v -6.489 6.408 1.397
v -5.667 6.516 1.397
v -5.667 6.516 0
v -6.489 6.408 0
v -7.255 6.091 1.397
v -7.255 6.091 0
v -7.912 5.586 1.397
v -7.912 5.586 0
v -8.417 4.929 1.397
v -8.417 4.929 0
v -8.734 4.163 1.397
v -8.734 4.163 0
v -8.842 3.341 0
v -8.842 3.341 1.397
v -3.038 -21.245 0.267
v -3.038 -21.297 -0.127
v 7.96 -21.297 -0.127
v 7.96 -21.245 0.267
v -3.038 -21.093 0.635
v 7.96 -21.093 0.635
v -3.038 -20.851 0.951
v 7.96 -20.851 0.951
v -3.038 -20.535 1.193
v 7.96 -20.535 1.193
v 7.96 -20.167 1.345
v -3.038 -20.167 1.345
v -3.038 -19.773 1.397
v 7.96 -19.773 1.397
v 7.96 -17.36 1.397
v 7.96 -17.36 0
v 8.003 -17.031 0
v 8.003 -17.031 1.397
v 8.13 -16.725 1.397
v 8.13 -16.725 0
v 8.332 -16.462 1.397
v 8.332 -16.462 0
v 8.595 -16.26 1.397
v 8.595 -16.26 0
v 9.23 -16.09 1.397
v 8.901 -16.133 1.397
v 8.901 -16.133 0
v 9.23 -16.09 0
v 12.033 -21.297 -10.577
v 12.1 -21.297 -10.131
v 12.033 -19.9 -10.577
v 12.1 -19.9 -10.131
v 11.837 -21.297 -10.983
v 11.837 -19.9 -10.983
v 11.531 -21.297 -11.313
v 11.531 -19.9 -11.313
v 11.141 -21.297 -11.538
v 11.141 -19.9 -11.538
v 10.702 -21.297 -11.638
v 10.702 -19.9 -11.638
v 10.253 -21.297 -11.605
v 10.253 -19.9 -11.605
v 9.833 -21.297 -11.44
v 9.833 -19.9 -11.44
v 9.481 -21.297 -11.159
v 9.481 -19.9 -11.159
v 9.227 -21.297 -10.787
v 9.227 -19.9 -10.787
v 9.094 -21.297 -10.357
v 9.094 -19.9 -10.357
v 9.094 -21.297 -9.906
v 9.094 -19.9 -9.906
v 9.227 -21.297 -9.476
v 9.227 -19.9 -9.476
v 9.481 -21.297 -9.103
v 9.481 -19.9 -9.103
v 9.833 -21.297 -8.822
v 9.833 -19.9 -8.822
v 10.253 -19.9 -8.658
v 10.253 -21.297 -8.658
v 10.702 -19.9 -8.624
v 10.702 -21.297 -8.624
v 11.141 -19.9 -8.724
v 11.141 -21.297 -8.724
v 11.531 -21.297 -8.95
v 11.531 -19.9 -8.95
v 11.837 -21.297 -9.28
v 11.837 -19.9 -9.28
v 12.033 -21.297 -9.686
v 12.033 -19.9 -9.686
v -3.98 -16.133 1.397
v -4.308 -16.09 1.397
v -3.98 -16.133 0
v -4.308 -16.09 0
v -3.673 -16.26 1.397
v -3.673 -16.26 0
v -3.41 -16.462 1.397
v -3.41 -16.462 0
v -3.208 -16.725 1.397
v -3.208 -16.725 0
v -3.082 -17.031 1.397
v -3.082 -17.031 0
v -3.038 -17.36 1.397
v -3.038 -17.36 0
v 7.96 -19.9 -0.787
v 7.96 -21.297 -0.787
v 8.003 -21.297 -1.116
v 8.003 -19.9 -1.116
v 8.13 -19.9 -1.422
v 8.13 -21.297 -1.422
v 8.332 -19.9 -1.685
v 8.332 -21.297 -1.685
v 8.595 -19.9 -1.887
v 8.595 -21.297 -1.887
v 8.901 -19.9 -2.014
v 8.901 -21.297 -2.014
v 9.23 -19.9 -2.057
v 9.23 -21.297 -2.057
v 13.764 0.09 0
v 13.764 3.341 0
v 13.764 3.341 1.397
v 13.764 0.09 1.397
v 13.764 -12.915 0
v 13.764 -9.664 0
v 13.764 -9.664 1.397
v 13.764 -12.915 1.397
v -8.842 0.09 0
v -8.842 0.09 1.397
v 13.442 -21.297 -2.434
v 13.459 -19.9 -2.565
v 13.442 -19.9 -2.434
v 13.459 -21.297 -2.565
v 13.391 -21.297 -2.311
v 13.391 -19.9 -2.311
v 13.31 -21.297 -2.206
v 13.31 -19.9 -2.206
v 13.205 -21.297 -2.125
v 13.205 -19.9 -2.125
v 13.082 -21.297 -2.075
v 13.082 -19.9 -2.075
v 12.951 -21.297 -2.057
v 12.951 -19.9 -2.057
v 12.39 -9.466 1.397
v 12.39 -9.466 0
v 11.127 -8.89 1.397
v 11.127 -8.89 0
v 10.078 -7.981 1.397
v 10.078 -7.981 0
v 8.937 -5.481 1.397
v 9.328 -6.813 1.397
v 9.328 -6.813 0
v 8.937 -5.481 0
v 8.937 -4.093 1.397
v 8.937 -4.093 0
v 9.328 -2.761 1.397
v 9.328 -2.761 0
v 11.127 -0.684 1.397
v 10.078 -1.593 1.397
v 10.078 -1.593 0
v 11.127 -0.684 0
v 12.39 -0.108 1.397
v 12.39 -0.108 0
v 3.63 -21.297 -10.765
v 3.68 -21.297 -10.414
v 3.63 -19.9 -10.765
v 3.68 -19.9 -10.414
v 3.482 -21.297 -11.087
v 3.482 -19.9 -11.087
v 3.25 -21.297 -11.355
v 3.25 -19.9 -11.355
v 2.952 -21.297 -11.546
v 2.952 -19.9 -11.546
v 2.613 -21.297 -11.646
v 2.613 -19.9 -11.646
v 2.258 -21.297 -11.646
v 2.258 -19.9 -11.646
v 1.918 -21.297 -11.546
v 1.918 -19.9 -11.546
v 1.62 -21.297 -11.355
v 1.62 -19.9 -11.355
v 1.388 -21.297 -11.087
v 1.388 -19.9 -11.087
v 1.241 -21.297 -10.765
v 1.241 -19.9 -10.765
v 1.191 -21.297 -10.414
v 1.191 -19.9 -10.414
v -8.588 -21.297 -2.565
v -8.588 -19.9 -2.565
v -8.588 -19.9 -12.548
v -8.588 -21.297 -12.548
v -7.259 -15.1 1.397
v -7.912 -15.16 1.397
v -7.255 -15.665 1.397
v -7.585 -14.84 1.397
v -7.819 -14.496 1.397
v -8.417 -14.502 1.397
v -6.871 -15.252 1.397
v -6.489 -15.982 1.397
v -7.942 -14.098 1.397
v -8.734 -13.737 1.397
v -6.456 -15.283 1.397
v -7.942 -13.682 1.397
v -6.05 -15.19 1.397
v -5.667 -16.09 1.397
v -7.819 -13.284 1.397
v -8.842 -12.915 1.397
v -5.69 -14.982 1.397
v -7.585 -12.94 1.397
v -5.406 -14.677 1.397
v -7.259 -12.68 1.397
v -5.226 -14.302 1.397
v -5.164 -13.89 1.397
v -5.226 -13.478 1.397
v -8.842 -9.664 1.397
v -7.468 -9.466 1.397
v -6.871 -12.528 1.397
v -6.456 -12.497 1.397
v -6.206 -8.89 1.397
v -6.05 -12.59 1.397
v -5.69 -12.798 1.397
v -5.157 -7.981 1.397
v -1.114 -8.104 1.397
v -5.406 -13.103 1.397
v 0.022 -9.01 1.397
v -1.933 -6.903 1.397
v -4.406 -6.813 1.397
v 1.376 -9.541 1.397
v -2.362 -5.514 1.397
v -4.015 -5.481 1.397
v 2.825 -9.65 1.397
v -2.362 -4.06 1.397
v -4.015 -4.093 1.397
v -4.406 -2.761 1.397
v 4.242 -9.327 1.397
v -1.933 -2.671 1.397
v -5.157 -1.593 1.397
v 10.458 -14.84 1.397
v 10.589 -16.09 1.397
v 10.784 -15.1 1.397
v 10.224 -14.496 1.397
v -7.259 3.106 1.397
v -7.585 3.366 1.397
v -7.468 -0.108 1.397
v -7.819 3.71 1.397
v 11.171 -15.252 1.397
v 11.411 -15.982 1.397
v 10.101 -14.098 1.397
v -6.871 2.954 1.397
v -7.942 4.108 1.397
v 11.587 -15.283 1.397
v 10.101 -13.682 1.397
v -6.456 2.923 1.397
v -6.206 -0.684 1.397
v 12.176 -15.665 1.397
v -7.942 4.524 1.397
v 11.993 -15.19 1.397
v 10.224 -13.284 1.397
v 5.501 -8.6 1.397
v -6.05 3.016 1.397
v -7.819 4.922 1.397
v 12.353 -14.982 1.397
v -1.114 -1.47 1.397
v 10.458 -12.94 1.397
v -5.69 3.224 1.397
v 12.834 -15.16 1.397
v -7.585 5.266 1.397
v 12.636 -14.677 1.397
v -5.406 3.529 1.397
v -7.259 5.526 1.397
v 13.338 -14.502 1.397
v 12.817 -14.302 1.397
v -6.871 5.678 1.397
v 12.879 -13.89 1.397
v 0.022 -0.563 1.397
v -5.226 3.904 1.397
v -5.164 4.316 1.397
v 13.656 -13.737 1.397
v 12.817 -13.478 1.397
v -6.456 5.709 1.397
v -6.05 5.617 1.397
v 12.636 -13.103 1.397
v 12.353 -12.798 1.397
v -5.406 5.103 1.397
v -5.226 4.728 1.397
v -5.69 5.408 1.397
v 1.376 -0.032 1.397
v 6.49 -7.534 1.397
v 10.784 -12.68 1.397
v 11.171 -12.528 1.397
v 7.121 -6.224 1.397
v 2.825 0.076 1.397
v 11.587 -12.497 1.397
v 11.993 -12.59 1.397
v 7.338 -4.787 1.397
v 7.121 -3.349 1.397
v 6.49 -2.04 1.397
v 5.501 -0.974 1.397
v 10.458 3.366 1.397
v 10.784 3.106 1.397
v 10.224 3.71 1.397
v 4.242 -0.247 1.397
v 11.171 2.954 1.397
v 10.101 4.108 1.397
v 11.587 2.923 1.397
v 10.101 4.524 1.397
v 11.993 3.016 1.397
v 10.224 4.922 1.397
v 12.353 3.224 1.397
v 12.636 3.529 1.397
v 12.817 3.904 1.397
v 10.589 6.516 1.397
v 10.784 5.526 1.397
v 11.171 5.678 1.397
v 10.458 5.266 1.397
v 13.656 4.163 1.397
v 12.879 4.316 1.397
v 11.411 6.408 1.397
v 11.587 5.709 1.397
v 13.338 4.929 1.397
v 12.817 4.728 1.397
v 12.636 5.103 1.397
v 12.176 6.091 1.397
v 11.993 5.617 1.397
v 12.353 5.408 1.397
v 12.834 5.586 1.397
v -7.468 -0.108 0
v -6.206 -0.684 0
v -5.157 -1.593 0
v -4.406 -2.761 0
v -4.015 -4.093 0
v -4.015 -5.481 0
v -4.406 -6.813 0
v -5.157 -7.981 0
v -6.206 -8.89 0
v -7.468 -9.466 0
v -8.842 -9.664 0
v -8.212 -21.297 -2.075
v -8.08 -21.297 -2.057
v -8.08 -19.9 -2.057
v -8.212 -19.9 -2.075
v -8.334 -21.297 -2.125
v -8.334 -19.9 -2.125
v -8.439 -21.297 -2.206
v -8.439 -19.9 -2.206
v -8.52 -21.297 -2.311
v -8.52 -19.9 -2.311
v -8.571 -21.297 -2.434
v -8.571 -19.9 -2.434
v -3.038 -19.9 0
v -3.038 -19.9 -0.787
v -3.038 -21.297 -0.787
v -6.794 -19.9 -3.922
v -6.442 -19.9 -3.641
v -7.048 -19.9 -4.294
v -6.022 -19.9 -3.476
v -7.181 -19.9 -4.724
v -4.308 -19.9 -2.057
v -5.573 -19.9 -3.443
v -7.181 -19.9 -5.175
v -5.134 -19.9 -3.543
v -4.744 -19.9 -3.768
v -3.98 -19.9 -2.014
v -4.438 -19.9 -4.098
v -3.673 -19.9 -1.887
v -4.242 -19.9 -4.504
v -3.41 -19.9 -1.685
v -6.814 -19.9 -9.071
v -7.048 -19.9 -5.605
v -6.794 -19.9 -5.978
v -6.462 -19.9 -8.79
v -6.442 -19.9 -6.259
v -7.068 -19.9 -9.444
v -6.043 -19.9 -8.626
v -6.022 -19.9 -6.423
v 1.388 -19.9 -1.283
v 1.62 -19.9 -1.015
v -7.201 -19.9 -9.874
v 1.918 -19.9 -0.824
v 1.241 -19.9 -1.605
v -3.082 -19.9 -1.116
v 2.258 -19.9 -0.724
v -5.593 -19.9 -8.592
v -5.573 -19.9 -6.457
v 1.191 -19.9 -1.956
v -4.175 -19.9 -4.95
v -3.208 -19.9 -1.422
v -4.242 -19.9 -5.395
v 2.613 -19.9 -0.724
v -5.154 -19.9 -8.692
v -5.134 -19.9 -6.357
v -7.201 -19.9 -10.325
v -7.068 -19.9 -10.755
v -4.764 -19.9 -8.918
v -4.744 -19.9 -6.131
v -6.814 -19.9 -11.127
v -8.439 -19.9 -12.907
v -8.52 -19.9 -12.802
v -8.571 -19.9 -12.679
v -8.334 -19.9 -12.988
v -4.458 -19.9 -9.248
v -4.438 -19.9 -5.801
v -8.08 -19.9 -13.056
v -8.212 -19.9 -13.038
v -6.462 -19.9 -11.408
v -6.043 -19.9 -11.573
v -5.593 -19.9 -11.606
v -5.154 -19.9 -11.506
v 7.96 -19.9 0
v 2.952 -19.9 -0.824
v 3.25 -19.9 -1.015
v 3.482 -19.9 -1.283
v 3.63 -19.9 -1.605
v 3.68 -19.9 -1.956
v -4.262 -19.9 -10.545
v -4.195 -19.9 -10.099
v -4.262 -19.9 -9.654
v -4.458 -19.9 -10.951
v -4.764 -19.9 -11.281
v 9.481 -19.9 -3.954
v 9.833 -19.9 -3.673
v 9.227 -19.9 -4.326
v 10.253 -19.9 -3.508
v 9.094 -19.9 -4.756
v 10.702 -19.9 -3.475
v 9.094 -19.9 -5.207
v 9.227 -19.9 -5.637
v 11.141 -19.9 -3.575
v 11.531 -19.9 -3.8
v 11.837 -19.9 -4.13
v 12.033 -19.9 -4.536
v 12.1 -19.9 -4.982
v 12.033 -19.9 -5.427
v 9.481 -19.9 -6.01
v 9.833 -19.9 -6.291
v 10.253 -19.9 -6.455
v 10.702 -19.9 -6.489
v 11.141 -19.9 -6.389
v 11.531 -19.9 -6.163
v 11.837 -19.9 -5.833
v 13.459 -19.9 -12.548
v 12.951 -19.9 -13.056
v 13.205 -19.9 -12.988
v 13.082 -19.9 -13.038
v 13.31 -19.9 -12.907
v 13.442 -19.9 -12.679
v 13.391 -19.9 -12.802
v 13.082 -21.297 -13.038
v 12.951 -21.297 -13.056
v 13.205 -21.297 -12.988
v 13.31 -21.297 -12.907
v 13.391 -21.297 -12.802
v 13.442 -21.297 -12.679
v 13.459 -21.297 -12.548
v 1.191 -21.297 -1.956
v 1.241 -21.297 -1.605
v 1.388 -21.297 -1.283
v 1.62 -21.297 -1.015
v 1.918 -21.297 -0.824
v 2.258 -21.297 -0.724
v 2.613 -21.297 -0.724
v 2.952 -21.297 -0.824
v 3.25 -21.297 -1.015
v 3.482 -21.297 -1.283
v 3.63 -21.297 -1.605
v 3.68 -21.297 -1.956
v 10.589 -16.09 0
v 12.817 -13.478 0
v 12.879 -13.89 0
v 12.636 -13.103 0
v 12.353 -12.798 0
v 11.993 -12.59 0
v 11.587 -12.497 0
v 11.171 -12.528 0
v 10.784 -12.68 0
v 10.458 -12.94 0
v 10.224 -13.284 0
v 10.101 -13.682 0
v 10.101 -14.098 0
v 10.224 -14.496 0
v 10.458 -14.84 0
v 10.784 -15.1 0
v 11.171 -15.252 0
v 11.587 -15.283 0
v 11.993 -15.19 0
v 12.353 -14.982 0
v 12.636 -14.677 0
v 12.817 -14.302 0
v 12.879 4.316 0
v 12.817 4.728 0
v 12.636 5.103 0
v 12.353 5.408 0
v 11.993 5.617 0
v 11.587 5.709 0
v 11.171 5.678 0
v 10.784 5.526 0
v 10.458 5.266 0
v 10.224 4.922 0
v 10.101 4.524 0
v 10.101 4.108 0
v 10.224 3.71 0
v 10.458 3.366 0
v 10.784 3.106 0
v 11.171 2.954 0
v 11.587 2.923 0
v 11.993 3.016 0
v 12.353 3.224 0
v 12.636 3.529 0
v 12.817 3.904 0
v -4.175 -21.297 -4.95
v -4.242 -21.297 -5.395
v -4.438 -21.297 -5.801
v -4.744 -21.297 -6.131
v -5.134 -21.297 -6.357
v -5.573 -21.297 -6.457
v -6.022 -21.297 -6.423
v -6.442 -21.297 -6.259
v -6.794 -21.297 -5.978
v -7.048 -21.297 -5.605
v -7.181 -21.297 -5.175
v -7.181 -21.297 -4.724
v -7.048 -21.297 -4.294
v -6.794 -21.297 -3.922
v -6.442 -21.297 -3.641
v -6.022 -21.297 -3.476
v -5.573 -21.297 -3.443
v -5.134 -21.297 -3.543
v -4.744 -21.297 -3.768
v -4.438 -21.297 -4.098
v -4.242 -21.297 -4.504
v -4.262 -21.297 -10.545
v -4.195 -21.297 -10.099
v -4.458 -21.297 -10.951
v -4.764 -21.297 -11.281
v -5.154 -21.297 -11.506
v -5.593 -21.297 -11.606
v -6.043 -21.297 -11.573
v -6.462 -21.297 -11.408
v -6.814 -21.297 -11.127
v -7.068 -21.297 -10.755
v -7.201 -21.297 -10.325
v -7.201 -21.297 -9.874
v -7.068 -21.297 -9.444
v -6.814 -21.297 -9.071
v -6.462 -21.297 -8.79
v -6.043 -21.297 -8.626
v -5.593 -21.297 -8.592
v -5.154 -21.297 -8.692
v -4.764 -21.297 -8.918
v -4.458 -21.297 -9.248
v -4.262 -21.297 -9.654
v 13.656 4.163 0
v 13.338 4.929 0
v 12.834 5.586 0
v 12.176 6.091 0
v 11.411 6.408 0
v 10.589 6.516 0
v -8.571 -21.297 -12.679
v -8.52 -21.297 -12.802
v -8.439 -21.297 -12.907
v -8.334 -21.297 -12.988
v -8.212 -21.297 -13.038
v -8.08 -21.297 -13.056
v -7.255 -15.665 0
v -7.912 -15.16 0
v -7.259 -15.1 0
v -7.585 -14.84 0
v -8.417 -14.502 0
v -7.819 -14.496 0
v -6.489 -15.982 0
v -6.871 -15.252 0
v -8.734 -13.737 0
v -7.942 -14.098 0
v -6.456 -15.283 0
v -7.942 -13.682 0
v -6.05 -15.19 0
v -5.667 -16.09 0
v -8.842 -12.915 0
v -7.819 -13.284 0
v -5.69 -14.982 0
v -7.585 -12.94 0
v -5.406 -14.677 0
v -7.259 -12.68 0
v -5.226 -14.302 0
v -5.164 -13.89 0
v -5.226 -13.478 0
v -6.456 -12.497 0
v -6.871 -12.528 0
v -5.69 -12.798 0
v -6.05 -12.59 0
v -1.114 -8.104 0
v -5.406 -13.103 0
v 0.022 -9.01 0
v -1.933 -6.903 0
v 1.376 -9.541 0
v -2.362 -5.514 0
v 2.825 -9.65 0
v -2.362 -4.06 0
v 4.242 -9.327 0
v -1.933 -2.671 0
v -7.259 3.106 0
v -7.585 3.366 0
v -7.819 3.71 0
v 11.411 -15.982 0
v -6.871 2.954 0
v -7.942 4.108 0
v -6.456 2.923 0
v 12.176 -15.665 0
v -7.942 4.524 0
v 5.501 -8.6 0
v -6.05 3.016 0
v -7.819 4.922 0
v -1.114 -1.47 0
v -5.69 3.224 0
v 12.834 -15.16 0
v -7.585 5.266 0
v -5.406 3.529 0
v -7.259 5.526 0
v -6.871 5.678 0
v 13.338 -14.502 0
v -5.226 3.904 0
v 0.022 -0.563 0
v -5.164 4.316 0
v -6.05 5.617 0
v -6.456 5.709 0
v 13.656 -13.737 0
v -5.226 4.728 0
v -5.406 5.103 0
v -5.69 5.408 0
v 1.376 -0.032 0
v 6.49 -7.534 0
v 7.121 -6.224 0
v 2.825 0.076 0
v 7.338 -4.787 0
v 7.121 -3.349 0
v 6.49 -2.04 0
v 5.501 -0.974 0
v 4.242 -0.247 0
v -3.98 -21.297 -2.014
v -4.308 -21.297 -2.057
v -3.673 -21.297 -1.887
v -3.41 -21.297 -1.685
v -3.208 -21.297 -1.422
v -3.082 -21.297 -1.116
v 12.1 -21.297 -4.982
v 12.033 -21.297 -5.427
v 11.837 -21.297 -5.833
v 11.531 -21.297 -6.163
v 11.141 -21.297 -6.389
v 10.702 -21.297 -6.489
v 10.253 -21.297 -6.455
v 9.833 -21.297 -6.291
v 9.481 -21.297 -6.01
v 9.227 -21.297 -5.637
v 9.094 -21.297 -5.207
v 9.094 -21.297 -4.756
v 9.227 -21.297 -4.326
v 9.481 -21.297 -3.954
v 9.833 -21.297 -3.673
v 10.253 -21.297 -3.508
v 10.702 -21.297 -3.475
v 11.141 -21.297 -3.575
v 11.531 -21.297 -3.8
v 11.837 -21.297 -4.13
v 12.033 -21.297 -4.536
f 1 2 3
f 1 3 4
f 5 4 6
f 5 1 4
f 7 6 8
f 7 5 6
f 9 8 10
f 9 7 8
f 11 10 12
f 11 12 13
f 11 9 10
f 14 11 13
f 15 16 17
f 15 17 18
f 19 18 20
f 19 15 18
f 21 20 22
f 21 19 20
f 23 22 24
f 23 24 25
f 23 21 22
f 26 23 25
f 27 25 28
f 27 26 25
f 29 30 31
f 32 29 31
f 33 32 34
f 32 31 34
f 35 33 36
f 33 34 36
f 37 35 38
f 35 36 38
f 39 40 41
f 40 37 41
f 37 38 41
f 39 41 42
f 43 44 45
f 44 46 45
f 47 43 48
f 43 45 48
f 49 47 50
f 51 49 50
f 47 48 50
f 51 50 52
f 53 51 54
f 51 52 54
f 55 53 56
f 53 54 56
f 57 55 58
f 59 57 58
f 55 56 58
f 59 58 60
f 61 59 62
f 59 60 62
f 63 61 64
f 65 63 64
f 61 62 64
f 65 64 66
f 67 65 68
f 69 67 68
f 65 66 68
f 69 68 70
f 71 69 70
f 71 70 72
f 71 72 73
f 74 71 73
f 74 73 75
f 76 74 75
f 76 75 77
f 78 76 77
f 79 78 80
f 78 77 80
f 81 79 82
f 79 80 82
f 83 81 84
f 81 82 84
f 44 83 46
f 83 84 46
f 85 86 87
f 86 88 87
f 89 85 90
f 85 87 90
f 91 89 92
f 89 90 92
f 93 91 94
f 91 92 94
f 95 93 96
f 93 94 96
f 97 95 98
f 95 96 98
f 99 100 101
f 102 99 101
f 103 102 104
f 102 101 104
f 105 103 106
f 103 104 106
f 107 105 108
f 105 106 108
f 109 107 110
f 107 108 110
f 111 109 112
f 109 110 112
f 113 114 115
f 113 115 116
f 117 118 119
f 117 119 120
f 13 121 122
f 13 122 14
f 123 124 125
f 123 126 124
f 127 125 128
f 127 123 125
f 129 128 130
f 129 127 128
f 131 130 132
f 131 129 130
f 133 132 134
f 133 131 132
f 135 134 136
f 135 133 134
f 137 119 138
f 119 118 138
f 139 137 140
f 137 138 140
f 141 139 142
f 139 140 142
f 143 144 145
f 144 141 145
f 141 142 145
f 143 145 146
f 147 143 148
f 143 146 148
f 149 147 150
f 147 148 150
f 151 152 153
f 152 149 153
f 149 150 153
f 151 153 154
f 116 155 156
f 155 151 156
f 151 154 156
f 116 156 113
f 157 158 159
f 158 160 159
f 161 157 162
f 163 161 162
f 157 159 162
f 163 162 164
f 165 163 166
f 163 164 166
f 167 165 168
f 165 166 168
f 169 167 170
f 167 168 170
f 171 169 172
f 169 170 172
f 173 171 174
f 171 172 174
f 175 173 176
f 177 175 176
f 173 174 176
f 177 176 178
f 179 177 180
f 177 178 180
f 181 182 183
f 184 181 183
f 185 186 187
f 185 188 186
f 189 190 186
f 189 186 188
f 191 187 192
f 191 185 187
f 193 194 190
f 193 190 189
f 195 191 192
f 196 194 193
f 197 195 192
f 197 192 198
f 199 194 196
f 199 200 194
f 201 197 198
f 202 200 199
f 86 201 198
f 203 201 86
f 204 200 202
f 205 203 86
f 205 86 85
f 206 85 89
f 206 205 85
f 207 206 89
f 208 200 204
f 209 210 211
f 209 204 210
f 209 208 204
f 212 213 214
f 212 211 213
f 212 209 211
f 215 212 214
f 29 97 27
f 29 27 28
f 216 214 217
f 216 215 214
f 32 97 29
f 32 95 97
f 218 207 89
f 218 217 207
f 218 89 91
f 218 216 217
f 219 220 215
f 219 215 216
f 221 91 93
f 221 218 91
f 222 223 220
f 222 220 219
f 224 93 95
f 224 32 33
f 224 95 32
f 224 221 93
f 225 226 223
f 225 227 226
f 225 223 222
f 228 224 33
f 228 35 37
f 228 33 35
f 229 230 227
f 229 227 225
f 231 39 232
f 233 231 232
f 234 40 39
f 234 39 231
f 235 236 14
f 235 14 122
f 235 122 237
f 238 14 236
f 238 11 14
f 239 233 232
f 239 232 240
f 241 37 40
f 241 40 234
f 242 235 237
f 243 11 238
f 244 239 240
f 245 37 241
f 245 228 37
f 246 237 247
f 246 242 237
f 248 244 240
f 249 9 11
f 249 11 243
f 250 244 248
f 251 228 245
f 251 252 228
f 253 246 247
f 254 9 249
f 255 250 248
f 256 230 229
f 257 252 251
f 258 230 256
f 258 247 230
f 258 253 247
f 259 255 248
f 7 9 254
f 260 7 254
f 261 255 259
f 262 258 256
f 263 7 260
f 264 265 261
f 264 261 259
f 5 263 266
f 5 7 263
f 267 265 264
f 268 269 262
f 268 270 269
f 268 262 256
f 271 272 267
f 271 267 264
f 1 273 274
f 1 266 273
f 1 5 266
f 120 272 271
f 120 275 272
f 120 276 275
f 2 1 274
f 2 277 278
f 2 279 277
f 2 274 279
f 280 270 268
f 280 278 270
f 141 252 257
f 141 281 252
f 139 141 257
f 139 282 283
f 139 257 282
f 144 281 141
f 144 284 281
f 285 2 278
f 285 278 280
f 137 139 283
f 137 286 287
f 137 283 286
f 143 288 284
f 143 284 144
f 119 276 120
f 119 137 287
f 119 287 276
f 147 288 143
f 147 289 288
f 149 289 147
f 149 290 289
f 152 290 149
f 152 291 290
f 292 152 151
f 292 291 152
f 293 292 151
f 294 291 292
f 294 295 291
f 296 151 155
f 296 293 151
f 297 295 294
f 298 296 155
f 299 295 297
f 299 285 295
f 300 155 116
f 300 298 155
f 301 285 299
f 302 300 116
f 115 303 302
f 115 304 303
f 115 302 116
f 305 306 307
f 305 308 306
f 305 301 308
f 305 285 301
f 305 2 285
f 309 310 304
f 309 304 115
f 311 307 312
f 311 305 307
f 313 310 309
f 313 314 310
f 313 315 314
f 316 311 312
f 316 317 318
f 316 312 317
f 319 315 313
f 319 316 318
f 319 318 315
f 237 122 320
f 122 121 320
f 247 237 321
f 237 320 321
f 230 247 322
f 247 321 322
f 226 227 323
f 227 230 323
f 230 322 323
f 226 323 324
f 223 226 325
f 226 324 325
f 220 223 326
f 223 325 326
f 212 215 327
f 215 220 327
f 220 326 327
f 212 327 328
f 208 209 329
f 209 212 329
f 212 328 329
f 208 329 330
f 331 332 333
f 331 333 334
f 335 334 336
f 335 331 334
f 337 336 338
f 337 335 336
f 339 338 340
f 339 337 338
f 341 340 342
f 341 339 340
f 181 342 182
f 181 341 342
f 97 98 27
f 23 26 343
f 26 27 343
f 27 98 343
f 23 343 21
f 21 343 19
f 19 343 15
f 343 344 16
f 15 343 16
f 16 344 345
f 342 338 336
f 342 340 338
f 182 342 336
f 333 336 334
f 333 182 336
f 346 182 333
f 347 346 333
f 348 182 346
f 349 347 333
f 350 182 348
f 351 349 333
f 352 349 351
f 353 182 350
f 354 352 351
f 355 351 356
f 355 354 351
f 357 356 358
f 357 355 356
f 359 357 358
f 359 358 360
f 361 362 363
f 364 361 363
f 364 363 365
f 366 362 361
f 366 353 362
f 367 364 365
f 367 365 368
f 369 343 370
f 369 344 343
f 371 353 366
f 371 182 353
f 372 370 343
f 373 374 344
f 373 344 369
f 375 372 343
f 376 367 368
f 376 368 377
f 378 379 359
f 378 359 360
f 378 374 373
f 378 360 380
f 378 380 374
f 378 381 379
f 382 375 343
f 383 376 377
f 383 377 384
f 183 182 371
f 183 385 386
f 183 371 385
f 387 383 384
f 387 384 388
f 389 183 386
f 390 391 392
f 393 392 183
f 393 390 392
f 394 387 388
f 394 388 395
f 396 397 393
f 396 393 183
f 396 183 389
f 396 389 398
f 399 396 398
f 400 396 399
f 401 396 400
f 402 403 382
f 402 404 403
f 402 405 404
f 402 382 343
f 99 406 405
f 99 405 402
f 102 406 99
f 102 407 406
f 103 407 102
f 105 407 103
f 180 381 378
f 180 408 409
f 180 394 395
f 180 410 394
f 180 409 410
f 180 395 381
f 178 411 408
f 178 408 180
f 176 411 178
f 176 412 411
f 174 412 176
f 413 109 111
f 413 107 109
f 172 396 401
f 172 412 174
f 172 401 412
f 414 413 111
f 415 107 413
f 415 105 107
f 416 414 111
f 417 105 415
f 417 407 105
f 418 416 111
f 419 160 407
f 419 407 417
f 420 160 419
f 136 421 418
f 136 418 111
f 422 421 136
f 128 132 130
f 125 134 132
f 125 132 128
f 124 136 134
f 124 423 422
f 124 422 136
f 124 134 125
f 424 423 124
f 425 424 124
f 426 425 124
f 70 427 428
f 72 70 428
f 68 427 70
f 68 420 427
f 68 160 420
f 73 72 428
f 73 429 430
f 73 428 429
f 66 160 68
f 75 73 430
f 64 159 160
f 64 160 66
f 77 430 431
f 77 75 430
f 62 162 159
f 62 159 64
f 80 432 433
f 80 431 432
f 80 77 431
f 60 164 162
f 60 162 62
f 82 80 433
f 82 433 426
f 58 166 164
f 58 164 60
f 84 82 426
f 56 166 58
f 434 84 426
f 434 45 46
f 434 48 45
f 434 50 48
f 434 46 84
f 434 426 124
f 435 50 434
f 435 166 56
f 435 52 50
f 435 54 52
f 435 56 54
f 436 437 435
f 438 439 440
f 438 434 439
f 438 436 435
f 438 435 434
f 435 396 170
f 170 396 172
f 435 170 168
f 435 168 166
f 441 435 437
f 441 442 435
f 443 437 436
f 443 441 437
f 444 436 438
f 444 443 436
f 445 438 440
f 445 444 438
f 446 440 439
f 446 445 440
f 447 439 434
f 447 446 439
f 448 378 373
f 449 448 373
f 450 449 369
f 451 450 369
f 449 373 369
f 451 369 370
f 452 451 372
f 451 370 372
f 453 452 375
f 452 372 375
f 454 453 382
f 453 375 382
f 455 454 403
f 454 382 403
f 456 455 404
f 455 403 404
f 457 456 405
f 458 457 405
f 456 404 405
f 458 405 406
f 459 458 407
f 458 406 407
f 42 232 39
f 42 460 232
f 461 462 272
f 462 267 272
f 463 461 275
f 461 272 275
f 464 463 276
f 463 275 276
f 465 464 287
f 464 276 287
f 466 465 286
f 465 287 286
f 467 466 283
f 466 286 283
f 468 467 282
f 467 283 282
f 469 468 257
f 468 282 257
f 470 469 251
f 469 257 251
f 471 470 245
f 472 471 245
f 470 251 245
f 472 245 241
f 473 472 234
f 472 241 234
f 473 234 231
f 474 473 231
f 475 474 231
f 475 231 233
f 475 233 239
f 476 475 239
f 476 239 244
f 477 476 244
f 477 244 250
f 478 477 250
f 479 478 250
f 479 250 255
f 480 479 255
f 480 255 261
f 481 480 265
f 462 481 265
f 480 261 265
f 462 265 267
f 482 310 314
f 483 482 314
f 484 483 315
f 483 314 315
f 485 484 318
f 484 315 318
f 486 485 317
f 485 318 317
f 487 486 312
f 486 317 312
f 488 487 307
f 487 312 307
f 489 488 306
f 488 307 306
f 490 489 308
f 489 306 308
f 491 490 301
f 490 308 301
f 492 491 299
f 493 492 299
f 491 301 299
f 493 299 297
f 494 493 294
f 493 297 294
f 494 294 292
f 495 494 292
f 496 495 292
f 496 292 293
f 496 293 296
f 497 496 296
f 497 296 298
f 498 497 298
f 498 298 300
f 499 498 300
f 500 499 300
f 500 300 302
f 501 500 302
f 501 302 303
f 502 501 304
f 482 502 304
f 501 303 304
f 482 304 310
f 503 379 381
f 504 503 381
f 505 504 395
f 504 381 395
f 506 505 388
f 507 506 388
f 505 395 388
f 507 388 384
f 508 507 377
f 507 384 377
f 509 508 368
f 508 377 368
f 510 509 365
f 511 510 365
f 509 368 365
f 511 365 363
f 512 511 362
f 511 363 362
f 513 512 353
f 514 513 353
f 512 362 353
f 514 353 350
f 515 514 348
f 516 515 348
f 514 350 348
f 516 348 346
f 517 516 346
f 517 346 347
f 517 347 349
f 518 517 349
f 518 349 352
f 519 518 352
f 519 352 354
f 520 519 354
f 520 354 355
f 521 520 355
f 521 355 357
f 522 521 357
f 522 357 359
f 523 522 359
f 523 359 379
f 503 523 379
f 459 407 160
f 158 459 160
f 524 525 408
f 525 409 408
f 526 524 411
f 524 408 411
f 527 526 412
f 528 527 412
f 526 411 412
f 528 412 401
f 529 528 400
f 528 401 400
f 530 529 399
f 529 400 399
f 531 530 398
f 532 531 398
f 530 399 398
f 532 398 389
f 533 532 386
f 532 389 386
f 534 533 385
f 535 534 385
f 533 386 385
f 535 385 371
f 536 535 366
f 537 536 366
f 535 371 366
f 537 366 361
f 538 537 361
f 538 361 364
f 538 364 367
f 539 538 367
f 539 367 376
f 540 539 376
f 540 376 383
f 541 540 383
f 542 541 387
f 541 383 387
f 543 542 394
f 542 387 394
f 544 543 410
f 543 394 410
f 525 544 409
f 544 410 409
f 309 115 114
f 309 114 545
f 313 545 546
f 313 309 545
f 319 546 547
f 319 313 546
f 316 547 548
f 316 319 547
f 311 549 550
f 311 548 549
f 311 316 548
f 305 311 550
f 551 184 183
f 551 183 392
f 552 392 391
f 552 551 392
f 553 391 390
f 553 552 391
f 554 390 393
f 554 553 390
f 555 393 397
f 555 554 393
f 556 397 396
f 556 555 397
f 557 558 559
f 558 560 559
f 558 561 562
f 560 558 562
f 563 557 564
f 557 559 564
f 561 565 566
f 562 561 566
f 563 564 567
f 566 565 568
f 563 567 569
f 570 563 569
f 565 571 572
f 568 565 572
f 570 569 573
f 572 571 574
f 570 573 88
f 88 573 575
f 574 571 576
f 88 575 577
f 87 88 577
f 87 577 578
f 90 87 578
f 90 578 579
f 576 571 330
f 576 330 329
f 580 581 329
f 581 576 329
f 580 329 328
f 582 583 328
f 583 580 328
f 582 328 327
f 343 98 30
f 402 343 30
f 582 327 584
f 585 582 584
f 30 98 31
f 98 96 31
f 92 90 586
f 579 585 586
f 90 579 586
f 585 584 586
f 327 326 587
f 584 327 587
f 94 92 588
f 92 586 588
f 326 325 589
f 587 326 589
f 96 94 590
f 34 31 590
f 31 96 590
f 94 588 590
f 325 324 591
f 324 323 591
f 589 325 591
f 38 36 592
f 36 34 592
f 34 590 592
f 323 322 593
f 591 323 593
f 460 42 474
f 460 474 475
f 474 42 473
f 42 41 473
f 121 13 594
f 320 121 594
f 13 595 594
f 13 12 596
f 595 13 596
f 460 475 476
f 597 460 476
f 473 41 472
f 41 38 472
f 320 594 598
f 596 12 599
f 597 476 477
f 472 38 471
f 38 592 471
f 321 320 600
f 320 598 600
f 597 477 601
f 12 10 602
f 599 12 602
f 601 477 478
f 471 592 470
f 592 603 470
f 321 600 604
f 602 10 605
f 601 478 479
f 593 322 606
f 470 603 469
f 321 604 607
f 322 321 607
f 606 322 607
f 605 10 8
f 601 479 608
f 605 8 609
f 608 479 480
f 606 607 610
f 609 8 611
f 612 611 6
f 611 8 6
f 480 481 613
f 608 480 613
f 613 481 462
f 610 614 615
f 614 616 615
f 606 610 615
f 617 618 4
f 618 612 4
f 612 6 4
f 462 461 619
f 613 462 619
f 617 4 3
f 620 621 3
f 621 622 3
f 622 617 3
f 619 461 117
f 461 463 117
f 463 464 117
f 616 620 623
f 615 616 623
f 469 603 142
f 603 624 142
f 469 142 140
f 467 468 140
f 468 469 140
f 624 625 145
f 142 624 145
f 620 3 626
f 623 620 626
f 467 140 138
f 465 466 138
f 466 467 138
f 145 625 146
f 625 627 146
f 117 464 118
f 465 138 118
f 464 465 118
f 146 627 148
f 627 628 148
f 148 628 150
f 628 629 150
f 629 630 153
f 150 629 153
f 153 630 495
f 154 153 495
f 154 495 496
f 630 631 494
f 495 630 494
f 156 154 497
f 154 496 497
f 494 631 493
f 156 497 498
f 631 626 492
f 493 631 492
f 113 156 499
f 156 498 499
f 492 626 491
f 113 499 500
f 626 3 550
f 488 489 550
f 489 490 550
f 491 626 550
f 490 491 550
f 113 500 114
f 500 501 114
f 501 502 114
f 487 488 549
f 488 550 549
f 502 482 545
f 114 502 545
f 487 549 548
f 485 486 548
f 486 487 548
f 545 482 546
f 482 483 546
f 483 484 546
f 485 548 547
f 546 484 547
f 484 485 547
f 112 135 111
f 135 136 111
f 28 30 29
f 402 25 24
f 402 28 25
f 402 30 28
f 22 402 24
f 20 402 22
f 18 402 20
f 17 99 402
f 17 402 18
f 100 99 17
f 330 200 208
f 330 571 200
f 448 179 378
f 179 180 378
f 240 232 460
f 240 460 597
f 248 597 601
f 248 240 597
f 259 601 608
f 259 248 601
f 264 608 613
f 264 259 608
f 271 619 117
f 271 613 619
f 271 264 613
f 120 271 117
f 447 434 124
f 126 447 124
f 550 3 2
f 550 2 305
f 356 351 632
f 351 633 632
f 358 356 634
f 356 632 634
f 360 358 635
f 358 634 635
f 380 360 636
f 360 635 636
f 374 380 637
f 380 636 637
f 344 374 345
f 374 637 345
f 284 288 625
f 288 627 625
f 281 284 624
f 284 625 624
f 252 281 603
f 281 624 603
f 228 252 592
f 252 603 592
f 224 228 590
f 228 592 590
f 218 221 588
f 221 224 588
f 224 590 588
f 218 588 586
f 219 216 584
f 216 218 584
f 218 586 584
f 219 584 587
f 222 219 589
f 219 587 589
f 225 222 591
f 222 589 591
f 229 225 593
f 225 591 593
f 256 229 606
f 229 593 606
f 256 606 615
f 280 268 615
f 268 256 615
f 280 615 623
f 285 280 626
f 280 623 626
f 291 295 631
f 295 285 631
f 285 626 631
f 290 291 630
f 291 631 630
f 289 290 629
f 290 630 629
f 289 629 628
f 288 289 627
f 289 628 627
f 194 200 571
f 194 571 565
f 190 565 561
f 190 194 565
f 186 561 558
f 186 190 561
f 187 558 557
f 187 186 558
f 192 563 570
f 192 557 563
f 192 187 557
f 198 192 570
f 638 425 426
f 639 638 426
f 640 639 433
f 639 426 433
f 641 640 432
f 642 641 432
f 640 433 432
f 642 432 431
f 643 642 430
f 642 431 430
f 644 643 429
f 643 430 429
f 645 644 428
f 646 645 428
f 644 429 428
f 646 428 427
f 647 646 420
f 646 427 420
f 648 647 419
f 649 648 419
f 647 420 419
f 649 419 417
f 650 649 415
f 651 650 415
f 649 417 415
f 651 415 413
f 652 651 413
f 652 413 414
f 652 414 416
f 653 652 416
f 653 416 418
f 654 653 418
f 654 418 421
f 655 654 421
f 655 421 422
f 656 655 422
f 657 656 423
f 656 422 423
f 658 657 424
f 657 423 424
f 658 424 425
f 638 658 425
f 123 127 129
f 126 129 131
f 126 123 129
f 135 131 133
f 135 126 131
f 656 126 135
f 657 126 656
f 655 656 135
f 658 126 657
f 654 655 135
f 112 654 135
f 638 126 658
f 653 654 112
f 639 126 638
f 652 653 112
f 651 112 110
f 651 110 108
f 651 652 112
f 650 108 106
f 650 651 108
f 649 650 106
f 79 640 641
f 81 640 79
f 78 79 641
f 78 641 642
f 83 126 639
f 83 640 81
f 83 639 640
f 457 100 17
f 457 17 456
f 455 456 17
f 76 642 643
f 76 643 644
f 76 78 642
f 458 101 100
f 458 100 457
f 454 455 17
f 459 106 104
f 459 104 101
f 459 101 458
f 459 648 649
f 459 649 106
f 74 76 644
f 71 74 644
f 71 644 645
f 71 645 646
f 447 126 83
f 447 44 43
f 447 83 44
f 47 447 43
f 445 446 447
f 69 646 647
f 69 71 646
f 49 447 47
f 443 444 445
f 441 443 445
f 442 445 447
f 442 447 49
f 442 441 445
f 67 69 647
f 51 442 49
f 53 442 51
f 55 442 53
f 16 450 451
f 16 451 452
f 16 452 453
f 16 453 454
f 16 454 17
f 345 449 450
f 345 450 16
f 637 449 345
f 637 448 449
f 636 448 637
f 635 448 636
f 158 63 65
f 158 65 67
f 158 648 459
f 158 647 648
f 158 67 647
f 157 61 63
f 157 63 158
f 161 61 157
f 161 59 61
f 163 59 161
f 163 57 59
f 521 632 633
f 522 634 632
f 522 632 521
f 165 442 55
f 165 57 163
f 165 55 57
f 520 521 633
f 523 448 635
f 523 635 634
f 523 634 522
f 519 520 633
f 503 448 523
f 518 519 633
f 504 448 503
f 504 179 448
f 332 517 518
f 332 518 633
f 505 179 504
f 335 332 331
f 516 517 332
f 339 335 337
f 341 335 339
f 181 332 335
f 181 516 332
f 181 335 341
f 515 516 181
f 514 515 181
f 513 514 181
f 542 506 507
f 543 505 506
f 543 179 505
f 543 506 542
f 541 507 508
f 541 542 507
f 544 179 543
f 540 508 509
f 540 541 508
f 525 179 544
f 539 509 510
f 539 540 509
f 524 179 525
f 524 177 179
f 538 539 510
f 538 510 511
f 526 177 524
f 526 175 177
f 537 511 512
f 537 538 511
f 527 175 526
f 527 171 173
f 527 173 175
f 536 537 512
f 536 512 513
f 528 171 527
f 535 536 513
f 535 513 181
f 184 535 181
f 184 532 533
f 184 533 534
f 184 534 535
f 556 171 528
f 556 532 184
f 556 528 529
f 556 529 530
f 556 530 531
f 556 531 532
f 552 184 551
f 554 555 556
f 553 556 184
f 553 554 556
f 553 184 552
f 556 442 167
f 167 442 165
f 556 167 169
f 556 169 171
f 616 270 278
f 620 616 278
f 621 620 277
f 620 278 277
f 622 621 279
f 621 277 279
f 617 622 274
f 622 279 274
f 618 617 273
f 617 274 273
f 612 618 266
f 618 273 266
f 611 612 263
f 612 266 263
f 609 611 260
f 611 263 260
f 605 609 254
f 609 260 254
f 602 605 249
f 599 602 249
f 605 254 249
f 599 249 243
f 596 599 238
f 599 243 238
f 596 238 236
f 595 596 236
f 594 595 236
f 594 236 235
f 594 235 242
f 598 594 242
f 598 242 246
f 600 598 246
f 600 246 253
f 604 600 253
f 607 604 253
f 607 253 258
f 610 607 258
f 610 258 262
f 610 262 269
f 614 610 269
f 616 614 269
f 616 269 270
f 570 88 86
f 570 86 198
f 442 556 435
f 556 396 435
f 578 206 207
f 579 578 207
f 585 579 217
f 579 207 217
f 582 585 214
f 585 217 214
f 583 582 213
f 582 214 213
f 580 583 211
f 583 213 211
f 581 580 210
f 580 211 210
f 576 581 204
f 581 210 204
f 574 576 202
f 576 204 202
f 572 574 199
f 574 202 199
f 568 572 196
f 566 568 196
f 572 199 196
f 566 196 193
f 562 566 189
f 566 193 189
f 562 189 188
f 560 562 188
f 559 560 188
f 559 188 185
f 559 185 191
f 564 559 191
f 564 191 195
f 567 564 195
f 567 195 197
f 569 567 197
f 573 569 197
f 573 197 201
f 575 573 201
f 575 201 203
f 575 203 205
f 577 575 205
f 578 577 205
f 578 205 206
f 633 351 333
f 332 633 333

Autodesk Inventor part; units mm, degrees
ref_plane "YZ Plane" through (0, 0, 0) normal (1, 0, 0) x (0, 1, 0)
ref_plane "XZ Plane" through (0, 0, 0) normal (0, 1, 0) x (-1, 0, 0)
ref_plane "XY Plane" through (0, 0, 0) normal (0, 0, 1) x (1, 0, 0)
sketch "Sketch1" plane through (0, 0, 0) normal (0, 0, 1) x (1, 0, 0)
  line L0 (-8.8422, 6.5161) -> (13.7638, 6.5161)
  line L1 (13.7638, -16.0899) -> (-8.8422, -16.0899)
  circle A0 centre (2.4608, -4.7869) radius 4.8768
  arc A1 (-8.8422, -9.6637) -> (-8.8422, 0.0899) centre (-8.8422, -4.7869) ccw
  line L2 (-8.8422, -16.0899) -> (-8.8422, -9.6637)
  line L3 (-8.8422, 0.0899) -> (-8.8422, 6.5161)
  arc A2 (13.7638, 0.0899) -> (13.7638, -9.6637) centre (13.7638, -4.7869) ccw
  line L4 (13.7638, 6.5161) -> (13.7638, 0.0899)
  line L5 (13.7638, -9.6637) -> (13.7638, -16.0899)
  dimension "d2" = 22.606
  dimension "d3" = 22.606
  dimension "d4" = 9.7536
  dimension "d5" = 9.7536
extrude "Extrusion1" add sketch "Sketch1" along normal blind 1.397
fillet "Fillet1" radius 3.175 4 edges at (-8.8422, 6.5161, 0.6985) (13.7638, 6.5161, 0.6985) (13.7638, -16.0899, 0.6985) (-8.8422, -16.0899, 0.6985)
sketch "Sketch2" plane through (0, 0, 1.397) normal (0, 0, 1) x (1, 0, 0)
  line L0 (-8.8422, 3.3411) -> (-8.8422, 0.0899) projected
  circle A0 centre (-6.5606, 4.3162) radius 1.397
  line L1 (10.5888, 6.5161) -> (-5.6672, 6.5161) projected
  arc A1 (-8.8422, -9.6637) -> (-8.8422, 0.0899) centre (-8.8422, -4.7869) ccw projected
  arc A2 (13.7638, 0.0899) -> (13.7638, -9.6637) centre (13.7638, -4.7869) ccw projected
  circle A3 centre (-6.5606, -13.89) radius 1.397
  line L2 (-5.6672, -16.0899) -> (10.5888, -16.0899) projected
  circle A4 centre (11.4822, 4.3162) radius 1.397
  circle A5 centre (11.4822, -13.89) radius 1.397
  point P0 (0, 0)
  dimension "d9" = 2.794
extrude "Extrusion2" cut sketch "Sketch2" against normal blind 1.397
sketch "Sketch3" plane through (0, 0, 1.397) normal (0, 0, 1) x (1, 0, 0)
  line L0 (2.4608, -16.0899) -> (2.4608, -9.6637)
  circle A0 centre (2.4608, -4.7869) radius 4.8768 projected
  line L1 (2.4608, -16.0899) -> (0.1367, -16.0899)
  line L2 (-3.0383, -16.0899) -> (7.9599, -16.0899)
  line L3 (2.4608, -16.0899) -> (7.9599, -16.0899)
  line L4 (2.4608, -16.0899) -> (7.9599, -16.0899)
  line L5 (10.5888, -16.0899) -> (-5.6672, -16.0899) projected
  line L6 (7.9599, -17.9949) -> (7.9599, -16.0899)
  line L7 (-3.0383, -17.9949) -> (-3.0383, -16.0899)
  line L8 (-3.0383, -17.9949) -> (-3.0383, -19.8999)
  line L9 (-3.0383, -19.8999) -> (7.9599, -19.8999)
  line L10 (7.9599, -19.8999) -> (7.9599, -17.9949)
  point P0 (0, 0)
  point P1 (-5.6672, -16.0899)
  dimension "d12" = 5.4991
  dimension "d13" = 5.4991
  dimension "d14" = 1.905
  dimension "d16" = 1.905
extrude "Extrusion3" add sketch "Sketch3" against normal blind 1.397 contours L2 L6 L10 L9 L8 L7 L1
fillet "Fillet2" radius 1.27 2 edges at (7.9599, -16.0899, 0.6985) (-3.0383, -16.0899, 0.6985)
sketch "Sketch4" plane through (-3.0383, -19.8999, 1.397) normal (0, -1, 0) x (1, 0, 0)
  line L0 (10.9982, -1.397) -> (0, -1.397) projected
  line L1 (10.9982, -1.397) -> (10.9982, -3.4544)
  line L2 (10.9982, -3.4544) -> (0, -3.4544)
  line L3 (0, -3.4544) -> (0, -1.397)
  point P0 (3.0383, -1.397)
  dimension "d20" = 2.0574
extrude "Extrusion4" add sketch "Sketch4" along normal blind 1.397
sketch "Sketch5" plane through (-3.0383, -19.8999, 1.397) normal (0, 1, 0) x (1, 0, 0)
  line L0 (10.9982, 3.4544) -> (10.9982, 1.397) projected
  line L1 (10.9982, 3.4544) -> (-5.5499, 3.4544)
  line L2 (-5.5499, 3.4544) -> (-5.5499, 14.4526)
  line L3 (-5.5499, 14.4526) -> (16.4973, 14.4526)
  line L4 (10.9982, 1.397) -> (0, 1.397) projected
  line L5 (0, 3.4544) -> (10.9982, 3.4544) projected
  line L6 (0, 3.4544) -> (10.9982, 3.4544) projected
  line L7 (16.4973, 14.4526) -> (16.4973, 3.4544)
  line L8 (16.4973, 3.4544) -> (10.9982, 3.4544)
  point P0 (5.4991, 3.4544)
  point P1 (5.4991, 3.4544)
  dimension "d25" = 22.0472
  dimension "d38" = 10.9982
extrude "Extrusion5" add sketch "Sketch5" against normal blind 1.397
fillet "Fillet3" radius 1.27 2 edges at (-3.0383, -20.5984, -2.0574) (7.9599, -20.5984, -2.0574)
fillet "Fillet4" radius 0.508 4 edges at (-8.5882, -20.5984, -2.0574) (-8.5882, -20.5984, -13.0556) (13.459, -20.5984, -2.0574) (13.459, -20.5984, -13.0556)
sketch "Sketch8" plane through (-3.0383, -19.8999, 0) normal (0, 0, 1) x (1, 0, 0)
  line L0 (0, 0) -> (0, -1.397) projected
  line L1 (0, -1.397) -> (0, 0)
  line L2 (10.9982, 0) -> (10.9982, -1.397) projected
  line L3 (0, 0) -> (10.9982, 0)
  line L4 (10.9982, 0) -> (10.9982, -1.397)
  line L5 (10.9982, -1.397) -> (0, -1.397)
  point P0 (3.0383, 19.8999)
extrude "Extrusion8" add sketch "Sketch8" along normal blind 1.397
fillet "Fillet5" radius 1.524 1 edges at (2.4608, -21.2969, 1.397)
sketch "Sketch11" plane through (-3.0383, -19.8999, 1.397) normal (0, 1, 0) x (1, 0, 0)
  line L0 (-5.0419, 14.4526) -> (15.9893, 14.4526) projected
  line L1 (-2.6289, 1.397) -> (13.6271, 1.397) projected
  line L2 (16.4973, 13.9446) -> (16.4973, 3.9624) projected
  line L3 (-5.5499, 13.9446) -> (-5.5499, 3.9624) projected
  circle A0 centre (13.6271, 11.5283) radius 1.5113
  line L4 (6.7183, 3.3528) -> (6.7183, 11.811)
  line L5 (4.2291, 11.811) -> (4.2291, 3.3528)
  arc A1 (4.2291, 3.3528) -> (6.7183, 3.3528) centre (5.4737, 3.3528) ccw
  arc A2 (6.7183, 11.811) -> (4.2291, 11.811) centre (5.4737, 11.811) ccw
  circle A3 centre (13.6271, 6.3787) radius 1.5113
  line L6 (0, 1.524) -> (10.9982, 1.524) projected
  circle A4 centre (-2.6681, 11.4963) radius 1.5113
  circle A5 centre (-2.6479, 6.3467) radius 1.5113
  point P0 (5.4737, 7.5819)
  dimension "d43" = 3.0226
  dimension "d47" = 2.8702
  dimension "d50" = 2.6416
  dimension "d51" = 1.9558
extrude "Extrusion10" cut sketch "Sketch11" against normal through all
properties part number "mcdave_mount"
